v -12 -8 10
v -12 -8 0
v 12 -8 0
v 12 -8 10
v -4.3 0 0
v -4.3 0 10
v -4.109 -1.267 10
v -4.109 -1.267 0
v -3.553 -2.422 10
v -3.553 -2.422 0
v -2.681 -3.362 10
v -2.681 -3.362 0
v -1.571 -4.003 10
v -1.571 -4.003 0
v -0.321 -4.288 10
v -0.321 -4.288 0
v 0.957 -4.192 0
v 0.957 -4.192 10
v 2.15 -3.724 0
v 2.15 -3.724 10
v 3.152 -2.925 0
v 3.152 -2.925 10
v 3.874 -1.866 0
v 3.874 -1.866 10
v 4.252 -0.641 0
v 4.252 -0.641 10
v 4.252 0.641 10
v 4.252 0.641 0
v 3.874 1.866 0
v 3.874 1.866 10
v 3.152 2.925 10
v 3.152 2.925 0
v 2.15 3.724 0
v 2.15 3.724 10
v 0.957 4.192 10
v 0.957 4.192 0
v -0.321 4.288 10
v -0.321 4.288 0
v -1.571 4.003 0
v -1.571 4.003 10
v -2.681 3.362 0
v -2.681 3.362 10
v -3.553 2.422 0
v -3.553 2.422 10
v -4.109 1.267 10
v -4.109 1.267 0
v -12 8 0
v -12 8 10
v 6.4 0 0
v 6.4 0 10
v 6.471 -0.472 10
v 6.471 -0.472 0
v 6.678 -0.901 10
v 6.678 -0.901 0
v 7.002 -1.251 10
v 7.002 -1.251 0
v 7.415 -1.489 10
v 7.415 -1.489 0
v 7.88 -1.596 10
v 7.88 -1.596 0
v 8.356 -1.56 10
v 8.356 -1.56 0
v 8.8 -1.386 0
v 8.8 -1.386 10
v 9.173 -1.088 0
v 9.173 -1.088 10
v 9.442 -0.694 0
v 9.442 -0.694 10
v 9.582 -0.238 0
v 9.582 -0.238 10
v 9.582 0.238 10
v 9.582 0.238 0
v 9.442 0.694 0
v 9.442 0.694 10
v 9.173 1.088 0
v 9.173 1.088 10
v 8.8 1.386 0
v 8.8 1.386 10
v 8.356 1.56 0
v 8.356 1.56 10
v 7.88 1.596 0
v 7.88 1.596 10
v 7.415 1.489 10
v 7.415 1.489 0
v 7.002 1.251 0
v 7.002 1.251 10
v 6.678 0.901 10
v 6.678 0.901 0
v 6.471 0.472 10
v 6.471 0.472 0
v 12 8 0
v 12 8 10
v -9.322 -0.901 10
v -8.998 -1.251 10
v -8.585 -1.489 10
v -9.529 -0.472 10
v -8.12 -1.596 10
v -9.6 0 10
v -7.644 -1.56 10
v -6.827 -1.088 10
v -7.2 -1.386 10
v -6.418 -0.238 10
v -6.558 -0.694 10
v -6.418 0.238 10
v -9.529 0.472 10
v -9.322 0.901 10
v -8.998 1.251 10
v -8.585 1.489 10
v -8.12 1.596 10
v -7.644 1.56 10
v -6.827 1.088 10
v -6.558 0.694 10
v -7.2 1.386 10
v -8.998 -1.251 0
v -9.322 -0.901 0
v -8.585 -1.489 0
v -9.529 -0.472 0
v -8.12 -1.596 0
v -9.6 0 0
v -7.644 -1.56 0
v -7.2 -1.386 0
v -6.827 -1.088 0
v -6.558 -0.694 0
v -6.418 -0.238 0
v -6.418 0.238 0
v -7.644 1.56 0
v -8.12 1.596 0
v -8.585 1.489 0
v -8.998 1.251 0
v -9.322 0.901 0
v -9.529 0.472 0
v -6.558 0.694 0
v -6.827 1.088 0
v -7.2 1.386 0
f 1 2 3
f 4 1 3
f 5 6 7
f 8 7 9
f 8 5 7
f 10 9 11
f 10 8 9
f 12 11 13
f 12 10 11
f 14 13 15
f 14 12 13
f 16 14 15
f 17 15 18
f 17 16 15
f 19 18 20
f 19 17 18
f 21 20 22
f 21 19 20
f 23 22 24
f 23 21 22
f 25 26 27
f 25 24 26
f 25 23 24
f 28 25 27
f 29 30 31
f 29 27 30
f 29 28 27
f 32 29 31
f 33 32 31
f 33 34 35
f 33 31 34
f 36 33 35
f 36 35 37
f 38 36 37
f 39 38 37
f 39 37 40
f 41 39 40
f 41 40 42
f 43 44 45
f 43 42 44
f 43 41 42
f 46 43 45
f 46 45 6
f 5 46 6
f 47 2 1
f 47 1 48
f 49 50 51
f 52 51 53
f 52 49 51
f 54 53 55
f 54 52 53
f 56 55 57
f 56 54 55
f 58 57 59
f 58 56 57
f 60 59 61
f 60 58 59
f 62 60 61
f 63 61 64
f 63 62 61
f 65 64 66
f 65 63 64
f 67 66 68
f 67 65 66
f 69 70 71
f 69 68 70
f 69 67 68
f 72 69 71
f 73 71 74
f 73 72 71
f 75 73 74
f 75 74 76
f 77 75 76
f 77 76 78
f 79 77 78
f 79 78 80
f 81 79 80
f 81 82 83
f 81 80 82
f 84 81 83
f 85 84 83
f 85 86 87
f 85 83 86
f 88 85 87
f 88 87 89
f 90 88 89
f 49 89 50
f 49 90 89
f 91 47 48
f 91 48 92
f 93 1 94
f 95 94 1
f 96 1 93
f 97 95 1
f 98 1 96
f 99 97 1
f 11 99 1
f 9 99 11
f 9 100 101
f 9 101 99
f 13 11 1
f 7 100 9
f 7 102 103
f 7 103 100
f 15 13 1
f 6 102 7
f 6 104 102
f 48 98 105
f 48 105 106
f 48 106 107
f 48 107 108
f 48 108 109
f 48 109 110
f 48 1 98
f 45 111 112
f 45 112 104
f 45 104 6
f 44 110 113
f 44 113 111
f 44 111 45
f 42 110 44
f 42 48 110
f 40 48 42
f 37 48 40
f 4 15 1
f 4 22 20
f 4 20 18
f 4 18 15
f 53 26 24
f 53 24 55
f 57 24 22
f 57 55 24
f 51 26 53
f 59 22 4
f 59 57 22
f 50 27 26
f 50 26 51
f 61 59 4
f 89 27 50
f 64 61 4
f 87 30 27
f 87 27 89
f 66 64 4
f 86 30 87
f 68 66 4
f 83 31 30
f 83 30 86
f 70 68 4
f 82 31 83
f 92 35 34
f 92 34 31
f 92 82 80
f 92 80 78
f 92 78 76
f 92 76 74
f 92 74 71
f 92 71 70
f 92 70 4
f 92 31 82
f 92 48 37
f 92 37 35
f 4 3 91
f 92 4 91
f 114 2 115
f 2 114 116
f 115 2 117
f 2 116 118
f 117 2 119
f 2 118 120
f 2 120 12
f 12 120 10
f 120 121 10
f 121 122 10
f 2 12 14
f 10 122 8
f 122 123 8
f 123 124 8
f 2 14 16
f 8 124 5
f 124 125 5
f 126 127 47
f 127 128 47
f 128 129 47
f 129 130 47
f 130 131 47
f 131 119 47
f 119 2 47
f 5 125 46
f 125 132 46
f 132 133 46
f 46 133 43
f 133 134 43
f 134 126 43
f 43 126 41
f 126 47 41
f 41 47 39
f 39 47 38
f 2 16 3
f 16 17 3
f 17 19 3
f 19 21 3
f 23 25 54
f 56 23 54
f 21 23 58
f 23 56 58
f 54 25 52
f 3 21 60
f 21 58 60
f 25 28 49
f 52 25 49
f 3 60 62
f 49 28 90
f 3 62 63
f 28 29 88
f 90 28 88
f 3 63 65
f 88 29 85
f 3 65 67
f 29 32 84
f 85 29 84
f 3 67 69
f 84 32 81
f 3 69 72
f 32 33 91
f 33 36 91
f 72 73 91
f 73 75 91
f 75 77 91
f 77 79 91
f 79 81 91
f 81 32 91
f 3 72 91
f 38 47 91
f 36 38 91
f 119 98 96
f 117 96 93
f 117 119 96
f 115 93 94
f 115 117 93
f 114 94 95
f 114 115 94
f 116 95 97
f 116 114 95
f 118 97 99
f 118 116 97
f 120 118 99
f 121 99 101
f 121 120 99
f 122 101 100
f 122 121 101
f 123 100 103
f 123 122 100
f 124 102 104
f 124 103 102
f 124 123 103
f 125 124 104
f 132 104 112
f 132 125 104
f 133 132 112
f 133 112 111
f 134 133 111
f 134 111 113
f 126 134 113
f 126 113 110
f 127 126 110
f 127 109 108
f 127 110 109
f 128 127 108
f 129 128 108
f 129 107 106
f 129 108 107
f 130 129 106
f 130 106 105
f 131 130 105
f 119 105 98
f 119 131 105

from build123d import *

# Parameters (mm, degrees)
SKETCH1_W           = 24
SKETCH1_H           = 16
BOSS_EXTRUDE1_DEPTH = 10
SKETCH2_R           = 4.3
SKETCH2_R_2         = 1.6
CUT_EXTRUDE2_DEPTH  = 11


with BuildPart() as part:
    # Sketch1 → Boss-Extrude1 (new body)
    with BuildSketch(Plane.XY):
        Rectangle(SKETCH1_W, SKETCH1_H)
    extrude(amount=BOSS_EXTRUDE1_DEPTH)

    # Sketch2 → Cut-Extrude2 (cut)
    with BuildSketch(Plane.XY):
        with Locations(Location((0, 0, 0), (0, 0, 180))):
            Circle(SKETCH2_R)
        with Locations(Location((8, 0, 0), (0, 0, 180))):
            Circle(SKETCH2_R_2)
        with Locations(Location((-8, 0, 0), (0, 0, 180))):
            Circle(SKETCH2_R_2)
    extrude(amount=CUT_EXTRUDE2_DEPTH, mode=Mode.SUBTRACT)


solid = part.part
